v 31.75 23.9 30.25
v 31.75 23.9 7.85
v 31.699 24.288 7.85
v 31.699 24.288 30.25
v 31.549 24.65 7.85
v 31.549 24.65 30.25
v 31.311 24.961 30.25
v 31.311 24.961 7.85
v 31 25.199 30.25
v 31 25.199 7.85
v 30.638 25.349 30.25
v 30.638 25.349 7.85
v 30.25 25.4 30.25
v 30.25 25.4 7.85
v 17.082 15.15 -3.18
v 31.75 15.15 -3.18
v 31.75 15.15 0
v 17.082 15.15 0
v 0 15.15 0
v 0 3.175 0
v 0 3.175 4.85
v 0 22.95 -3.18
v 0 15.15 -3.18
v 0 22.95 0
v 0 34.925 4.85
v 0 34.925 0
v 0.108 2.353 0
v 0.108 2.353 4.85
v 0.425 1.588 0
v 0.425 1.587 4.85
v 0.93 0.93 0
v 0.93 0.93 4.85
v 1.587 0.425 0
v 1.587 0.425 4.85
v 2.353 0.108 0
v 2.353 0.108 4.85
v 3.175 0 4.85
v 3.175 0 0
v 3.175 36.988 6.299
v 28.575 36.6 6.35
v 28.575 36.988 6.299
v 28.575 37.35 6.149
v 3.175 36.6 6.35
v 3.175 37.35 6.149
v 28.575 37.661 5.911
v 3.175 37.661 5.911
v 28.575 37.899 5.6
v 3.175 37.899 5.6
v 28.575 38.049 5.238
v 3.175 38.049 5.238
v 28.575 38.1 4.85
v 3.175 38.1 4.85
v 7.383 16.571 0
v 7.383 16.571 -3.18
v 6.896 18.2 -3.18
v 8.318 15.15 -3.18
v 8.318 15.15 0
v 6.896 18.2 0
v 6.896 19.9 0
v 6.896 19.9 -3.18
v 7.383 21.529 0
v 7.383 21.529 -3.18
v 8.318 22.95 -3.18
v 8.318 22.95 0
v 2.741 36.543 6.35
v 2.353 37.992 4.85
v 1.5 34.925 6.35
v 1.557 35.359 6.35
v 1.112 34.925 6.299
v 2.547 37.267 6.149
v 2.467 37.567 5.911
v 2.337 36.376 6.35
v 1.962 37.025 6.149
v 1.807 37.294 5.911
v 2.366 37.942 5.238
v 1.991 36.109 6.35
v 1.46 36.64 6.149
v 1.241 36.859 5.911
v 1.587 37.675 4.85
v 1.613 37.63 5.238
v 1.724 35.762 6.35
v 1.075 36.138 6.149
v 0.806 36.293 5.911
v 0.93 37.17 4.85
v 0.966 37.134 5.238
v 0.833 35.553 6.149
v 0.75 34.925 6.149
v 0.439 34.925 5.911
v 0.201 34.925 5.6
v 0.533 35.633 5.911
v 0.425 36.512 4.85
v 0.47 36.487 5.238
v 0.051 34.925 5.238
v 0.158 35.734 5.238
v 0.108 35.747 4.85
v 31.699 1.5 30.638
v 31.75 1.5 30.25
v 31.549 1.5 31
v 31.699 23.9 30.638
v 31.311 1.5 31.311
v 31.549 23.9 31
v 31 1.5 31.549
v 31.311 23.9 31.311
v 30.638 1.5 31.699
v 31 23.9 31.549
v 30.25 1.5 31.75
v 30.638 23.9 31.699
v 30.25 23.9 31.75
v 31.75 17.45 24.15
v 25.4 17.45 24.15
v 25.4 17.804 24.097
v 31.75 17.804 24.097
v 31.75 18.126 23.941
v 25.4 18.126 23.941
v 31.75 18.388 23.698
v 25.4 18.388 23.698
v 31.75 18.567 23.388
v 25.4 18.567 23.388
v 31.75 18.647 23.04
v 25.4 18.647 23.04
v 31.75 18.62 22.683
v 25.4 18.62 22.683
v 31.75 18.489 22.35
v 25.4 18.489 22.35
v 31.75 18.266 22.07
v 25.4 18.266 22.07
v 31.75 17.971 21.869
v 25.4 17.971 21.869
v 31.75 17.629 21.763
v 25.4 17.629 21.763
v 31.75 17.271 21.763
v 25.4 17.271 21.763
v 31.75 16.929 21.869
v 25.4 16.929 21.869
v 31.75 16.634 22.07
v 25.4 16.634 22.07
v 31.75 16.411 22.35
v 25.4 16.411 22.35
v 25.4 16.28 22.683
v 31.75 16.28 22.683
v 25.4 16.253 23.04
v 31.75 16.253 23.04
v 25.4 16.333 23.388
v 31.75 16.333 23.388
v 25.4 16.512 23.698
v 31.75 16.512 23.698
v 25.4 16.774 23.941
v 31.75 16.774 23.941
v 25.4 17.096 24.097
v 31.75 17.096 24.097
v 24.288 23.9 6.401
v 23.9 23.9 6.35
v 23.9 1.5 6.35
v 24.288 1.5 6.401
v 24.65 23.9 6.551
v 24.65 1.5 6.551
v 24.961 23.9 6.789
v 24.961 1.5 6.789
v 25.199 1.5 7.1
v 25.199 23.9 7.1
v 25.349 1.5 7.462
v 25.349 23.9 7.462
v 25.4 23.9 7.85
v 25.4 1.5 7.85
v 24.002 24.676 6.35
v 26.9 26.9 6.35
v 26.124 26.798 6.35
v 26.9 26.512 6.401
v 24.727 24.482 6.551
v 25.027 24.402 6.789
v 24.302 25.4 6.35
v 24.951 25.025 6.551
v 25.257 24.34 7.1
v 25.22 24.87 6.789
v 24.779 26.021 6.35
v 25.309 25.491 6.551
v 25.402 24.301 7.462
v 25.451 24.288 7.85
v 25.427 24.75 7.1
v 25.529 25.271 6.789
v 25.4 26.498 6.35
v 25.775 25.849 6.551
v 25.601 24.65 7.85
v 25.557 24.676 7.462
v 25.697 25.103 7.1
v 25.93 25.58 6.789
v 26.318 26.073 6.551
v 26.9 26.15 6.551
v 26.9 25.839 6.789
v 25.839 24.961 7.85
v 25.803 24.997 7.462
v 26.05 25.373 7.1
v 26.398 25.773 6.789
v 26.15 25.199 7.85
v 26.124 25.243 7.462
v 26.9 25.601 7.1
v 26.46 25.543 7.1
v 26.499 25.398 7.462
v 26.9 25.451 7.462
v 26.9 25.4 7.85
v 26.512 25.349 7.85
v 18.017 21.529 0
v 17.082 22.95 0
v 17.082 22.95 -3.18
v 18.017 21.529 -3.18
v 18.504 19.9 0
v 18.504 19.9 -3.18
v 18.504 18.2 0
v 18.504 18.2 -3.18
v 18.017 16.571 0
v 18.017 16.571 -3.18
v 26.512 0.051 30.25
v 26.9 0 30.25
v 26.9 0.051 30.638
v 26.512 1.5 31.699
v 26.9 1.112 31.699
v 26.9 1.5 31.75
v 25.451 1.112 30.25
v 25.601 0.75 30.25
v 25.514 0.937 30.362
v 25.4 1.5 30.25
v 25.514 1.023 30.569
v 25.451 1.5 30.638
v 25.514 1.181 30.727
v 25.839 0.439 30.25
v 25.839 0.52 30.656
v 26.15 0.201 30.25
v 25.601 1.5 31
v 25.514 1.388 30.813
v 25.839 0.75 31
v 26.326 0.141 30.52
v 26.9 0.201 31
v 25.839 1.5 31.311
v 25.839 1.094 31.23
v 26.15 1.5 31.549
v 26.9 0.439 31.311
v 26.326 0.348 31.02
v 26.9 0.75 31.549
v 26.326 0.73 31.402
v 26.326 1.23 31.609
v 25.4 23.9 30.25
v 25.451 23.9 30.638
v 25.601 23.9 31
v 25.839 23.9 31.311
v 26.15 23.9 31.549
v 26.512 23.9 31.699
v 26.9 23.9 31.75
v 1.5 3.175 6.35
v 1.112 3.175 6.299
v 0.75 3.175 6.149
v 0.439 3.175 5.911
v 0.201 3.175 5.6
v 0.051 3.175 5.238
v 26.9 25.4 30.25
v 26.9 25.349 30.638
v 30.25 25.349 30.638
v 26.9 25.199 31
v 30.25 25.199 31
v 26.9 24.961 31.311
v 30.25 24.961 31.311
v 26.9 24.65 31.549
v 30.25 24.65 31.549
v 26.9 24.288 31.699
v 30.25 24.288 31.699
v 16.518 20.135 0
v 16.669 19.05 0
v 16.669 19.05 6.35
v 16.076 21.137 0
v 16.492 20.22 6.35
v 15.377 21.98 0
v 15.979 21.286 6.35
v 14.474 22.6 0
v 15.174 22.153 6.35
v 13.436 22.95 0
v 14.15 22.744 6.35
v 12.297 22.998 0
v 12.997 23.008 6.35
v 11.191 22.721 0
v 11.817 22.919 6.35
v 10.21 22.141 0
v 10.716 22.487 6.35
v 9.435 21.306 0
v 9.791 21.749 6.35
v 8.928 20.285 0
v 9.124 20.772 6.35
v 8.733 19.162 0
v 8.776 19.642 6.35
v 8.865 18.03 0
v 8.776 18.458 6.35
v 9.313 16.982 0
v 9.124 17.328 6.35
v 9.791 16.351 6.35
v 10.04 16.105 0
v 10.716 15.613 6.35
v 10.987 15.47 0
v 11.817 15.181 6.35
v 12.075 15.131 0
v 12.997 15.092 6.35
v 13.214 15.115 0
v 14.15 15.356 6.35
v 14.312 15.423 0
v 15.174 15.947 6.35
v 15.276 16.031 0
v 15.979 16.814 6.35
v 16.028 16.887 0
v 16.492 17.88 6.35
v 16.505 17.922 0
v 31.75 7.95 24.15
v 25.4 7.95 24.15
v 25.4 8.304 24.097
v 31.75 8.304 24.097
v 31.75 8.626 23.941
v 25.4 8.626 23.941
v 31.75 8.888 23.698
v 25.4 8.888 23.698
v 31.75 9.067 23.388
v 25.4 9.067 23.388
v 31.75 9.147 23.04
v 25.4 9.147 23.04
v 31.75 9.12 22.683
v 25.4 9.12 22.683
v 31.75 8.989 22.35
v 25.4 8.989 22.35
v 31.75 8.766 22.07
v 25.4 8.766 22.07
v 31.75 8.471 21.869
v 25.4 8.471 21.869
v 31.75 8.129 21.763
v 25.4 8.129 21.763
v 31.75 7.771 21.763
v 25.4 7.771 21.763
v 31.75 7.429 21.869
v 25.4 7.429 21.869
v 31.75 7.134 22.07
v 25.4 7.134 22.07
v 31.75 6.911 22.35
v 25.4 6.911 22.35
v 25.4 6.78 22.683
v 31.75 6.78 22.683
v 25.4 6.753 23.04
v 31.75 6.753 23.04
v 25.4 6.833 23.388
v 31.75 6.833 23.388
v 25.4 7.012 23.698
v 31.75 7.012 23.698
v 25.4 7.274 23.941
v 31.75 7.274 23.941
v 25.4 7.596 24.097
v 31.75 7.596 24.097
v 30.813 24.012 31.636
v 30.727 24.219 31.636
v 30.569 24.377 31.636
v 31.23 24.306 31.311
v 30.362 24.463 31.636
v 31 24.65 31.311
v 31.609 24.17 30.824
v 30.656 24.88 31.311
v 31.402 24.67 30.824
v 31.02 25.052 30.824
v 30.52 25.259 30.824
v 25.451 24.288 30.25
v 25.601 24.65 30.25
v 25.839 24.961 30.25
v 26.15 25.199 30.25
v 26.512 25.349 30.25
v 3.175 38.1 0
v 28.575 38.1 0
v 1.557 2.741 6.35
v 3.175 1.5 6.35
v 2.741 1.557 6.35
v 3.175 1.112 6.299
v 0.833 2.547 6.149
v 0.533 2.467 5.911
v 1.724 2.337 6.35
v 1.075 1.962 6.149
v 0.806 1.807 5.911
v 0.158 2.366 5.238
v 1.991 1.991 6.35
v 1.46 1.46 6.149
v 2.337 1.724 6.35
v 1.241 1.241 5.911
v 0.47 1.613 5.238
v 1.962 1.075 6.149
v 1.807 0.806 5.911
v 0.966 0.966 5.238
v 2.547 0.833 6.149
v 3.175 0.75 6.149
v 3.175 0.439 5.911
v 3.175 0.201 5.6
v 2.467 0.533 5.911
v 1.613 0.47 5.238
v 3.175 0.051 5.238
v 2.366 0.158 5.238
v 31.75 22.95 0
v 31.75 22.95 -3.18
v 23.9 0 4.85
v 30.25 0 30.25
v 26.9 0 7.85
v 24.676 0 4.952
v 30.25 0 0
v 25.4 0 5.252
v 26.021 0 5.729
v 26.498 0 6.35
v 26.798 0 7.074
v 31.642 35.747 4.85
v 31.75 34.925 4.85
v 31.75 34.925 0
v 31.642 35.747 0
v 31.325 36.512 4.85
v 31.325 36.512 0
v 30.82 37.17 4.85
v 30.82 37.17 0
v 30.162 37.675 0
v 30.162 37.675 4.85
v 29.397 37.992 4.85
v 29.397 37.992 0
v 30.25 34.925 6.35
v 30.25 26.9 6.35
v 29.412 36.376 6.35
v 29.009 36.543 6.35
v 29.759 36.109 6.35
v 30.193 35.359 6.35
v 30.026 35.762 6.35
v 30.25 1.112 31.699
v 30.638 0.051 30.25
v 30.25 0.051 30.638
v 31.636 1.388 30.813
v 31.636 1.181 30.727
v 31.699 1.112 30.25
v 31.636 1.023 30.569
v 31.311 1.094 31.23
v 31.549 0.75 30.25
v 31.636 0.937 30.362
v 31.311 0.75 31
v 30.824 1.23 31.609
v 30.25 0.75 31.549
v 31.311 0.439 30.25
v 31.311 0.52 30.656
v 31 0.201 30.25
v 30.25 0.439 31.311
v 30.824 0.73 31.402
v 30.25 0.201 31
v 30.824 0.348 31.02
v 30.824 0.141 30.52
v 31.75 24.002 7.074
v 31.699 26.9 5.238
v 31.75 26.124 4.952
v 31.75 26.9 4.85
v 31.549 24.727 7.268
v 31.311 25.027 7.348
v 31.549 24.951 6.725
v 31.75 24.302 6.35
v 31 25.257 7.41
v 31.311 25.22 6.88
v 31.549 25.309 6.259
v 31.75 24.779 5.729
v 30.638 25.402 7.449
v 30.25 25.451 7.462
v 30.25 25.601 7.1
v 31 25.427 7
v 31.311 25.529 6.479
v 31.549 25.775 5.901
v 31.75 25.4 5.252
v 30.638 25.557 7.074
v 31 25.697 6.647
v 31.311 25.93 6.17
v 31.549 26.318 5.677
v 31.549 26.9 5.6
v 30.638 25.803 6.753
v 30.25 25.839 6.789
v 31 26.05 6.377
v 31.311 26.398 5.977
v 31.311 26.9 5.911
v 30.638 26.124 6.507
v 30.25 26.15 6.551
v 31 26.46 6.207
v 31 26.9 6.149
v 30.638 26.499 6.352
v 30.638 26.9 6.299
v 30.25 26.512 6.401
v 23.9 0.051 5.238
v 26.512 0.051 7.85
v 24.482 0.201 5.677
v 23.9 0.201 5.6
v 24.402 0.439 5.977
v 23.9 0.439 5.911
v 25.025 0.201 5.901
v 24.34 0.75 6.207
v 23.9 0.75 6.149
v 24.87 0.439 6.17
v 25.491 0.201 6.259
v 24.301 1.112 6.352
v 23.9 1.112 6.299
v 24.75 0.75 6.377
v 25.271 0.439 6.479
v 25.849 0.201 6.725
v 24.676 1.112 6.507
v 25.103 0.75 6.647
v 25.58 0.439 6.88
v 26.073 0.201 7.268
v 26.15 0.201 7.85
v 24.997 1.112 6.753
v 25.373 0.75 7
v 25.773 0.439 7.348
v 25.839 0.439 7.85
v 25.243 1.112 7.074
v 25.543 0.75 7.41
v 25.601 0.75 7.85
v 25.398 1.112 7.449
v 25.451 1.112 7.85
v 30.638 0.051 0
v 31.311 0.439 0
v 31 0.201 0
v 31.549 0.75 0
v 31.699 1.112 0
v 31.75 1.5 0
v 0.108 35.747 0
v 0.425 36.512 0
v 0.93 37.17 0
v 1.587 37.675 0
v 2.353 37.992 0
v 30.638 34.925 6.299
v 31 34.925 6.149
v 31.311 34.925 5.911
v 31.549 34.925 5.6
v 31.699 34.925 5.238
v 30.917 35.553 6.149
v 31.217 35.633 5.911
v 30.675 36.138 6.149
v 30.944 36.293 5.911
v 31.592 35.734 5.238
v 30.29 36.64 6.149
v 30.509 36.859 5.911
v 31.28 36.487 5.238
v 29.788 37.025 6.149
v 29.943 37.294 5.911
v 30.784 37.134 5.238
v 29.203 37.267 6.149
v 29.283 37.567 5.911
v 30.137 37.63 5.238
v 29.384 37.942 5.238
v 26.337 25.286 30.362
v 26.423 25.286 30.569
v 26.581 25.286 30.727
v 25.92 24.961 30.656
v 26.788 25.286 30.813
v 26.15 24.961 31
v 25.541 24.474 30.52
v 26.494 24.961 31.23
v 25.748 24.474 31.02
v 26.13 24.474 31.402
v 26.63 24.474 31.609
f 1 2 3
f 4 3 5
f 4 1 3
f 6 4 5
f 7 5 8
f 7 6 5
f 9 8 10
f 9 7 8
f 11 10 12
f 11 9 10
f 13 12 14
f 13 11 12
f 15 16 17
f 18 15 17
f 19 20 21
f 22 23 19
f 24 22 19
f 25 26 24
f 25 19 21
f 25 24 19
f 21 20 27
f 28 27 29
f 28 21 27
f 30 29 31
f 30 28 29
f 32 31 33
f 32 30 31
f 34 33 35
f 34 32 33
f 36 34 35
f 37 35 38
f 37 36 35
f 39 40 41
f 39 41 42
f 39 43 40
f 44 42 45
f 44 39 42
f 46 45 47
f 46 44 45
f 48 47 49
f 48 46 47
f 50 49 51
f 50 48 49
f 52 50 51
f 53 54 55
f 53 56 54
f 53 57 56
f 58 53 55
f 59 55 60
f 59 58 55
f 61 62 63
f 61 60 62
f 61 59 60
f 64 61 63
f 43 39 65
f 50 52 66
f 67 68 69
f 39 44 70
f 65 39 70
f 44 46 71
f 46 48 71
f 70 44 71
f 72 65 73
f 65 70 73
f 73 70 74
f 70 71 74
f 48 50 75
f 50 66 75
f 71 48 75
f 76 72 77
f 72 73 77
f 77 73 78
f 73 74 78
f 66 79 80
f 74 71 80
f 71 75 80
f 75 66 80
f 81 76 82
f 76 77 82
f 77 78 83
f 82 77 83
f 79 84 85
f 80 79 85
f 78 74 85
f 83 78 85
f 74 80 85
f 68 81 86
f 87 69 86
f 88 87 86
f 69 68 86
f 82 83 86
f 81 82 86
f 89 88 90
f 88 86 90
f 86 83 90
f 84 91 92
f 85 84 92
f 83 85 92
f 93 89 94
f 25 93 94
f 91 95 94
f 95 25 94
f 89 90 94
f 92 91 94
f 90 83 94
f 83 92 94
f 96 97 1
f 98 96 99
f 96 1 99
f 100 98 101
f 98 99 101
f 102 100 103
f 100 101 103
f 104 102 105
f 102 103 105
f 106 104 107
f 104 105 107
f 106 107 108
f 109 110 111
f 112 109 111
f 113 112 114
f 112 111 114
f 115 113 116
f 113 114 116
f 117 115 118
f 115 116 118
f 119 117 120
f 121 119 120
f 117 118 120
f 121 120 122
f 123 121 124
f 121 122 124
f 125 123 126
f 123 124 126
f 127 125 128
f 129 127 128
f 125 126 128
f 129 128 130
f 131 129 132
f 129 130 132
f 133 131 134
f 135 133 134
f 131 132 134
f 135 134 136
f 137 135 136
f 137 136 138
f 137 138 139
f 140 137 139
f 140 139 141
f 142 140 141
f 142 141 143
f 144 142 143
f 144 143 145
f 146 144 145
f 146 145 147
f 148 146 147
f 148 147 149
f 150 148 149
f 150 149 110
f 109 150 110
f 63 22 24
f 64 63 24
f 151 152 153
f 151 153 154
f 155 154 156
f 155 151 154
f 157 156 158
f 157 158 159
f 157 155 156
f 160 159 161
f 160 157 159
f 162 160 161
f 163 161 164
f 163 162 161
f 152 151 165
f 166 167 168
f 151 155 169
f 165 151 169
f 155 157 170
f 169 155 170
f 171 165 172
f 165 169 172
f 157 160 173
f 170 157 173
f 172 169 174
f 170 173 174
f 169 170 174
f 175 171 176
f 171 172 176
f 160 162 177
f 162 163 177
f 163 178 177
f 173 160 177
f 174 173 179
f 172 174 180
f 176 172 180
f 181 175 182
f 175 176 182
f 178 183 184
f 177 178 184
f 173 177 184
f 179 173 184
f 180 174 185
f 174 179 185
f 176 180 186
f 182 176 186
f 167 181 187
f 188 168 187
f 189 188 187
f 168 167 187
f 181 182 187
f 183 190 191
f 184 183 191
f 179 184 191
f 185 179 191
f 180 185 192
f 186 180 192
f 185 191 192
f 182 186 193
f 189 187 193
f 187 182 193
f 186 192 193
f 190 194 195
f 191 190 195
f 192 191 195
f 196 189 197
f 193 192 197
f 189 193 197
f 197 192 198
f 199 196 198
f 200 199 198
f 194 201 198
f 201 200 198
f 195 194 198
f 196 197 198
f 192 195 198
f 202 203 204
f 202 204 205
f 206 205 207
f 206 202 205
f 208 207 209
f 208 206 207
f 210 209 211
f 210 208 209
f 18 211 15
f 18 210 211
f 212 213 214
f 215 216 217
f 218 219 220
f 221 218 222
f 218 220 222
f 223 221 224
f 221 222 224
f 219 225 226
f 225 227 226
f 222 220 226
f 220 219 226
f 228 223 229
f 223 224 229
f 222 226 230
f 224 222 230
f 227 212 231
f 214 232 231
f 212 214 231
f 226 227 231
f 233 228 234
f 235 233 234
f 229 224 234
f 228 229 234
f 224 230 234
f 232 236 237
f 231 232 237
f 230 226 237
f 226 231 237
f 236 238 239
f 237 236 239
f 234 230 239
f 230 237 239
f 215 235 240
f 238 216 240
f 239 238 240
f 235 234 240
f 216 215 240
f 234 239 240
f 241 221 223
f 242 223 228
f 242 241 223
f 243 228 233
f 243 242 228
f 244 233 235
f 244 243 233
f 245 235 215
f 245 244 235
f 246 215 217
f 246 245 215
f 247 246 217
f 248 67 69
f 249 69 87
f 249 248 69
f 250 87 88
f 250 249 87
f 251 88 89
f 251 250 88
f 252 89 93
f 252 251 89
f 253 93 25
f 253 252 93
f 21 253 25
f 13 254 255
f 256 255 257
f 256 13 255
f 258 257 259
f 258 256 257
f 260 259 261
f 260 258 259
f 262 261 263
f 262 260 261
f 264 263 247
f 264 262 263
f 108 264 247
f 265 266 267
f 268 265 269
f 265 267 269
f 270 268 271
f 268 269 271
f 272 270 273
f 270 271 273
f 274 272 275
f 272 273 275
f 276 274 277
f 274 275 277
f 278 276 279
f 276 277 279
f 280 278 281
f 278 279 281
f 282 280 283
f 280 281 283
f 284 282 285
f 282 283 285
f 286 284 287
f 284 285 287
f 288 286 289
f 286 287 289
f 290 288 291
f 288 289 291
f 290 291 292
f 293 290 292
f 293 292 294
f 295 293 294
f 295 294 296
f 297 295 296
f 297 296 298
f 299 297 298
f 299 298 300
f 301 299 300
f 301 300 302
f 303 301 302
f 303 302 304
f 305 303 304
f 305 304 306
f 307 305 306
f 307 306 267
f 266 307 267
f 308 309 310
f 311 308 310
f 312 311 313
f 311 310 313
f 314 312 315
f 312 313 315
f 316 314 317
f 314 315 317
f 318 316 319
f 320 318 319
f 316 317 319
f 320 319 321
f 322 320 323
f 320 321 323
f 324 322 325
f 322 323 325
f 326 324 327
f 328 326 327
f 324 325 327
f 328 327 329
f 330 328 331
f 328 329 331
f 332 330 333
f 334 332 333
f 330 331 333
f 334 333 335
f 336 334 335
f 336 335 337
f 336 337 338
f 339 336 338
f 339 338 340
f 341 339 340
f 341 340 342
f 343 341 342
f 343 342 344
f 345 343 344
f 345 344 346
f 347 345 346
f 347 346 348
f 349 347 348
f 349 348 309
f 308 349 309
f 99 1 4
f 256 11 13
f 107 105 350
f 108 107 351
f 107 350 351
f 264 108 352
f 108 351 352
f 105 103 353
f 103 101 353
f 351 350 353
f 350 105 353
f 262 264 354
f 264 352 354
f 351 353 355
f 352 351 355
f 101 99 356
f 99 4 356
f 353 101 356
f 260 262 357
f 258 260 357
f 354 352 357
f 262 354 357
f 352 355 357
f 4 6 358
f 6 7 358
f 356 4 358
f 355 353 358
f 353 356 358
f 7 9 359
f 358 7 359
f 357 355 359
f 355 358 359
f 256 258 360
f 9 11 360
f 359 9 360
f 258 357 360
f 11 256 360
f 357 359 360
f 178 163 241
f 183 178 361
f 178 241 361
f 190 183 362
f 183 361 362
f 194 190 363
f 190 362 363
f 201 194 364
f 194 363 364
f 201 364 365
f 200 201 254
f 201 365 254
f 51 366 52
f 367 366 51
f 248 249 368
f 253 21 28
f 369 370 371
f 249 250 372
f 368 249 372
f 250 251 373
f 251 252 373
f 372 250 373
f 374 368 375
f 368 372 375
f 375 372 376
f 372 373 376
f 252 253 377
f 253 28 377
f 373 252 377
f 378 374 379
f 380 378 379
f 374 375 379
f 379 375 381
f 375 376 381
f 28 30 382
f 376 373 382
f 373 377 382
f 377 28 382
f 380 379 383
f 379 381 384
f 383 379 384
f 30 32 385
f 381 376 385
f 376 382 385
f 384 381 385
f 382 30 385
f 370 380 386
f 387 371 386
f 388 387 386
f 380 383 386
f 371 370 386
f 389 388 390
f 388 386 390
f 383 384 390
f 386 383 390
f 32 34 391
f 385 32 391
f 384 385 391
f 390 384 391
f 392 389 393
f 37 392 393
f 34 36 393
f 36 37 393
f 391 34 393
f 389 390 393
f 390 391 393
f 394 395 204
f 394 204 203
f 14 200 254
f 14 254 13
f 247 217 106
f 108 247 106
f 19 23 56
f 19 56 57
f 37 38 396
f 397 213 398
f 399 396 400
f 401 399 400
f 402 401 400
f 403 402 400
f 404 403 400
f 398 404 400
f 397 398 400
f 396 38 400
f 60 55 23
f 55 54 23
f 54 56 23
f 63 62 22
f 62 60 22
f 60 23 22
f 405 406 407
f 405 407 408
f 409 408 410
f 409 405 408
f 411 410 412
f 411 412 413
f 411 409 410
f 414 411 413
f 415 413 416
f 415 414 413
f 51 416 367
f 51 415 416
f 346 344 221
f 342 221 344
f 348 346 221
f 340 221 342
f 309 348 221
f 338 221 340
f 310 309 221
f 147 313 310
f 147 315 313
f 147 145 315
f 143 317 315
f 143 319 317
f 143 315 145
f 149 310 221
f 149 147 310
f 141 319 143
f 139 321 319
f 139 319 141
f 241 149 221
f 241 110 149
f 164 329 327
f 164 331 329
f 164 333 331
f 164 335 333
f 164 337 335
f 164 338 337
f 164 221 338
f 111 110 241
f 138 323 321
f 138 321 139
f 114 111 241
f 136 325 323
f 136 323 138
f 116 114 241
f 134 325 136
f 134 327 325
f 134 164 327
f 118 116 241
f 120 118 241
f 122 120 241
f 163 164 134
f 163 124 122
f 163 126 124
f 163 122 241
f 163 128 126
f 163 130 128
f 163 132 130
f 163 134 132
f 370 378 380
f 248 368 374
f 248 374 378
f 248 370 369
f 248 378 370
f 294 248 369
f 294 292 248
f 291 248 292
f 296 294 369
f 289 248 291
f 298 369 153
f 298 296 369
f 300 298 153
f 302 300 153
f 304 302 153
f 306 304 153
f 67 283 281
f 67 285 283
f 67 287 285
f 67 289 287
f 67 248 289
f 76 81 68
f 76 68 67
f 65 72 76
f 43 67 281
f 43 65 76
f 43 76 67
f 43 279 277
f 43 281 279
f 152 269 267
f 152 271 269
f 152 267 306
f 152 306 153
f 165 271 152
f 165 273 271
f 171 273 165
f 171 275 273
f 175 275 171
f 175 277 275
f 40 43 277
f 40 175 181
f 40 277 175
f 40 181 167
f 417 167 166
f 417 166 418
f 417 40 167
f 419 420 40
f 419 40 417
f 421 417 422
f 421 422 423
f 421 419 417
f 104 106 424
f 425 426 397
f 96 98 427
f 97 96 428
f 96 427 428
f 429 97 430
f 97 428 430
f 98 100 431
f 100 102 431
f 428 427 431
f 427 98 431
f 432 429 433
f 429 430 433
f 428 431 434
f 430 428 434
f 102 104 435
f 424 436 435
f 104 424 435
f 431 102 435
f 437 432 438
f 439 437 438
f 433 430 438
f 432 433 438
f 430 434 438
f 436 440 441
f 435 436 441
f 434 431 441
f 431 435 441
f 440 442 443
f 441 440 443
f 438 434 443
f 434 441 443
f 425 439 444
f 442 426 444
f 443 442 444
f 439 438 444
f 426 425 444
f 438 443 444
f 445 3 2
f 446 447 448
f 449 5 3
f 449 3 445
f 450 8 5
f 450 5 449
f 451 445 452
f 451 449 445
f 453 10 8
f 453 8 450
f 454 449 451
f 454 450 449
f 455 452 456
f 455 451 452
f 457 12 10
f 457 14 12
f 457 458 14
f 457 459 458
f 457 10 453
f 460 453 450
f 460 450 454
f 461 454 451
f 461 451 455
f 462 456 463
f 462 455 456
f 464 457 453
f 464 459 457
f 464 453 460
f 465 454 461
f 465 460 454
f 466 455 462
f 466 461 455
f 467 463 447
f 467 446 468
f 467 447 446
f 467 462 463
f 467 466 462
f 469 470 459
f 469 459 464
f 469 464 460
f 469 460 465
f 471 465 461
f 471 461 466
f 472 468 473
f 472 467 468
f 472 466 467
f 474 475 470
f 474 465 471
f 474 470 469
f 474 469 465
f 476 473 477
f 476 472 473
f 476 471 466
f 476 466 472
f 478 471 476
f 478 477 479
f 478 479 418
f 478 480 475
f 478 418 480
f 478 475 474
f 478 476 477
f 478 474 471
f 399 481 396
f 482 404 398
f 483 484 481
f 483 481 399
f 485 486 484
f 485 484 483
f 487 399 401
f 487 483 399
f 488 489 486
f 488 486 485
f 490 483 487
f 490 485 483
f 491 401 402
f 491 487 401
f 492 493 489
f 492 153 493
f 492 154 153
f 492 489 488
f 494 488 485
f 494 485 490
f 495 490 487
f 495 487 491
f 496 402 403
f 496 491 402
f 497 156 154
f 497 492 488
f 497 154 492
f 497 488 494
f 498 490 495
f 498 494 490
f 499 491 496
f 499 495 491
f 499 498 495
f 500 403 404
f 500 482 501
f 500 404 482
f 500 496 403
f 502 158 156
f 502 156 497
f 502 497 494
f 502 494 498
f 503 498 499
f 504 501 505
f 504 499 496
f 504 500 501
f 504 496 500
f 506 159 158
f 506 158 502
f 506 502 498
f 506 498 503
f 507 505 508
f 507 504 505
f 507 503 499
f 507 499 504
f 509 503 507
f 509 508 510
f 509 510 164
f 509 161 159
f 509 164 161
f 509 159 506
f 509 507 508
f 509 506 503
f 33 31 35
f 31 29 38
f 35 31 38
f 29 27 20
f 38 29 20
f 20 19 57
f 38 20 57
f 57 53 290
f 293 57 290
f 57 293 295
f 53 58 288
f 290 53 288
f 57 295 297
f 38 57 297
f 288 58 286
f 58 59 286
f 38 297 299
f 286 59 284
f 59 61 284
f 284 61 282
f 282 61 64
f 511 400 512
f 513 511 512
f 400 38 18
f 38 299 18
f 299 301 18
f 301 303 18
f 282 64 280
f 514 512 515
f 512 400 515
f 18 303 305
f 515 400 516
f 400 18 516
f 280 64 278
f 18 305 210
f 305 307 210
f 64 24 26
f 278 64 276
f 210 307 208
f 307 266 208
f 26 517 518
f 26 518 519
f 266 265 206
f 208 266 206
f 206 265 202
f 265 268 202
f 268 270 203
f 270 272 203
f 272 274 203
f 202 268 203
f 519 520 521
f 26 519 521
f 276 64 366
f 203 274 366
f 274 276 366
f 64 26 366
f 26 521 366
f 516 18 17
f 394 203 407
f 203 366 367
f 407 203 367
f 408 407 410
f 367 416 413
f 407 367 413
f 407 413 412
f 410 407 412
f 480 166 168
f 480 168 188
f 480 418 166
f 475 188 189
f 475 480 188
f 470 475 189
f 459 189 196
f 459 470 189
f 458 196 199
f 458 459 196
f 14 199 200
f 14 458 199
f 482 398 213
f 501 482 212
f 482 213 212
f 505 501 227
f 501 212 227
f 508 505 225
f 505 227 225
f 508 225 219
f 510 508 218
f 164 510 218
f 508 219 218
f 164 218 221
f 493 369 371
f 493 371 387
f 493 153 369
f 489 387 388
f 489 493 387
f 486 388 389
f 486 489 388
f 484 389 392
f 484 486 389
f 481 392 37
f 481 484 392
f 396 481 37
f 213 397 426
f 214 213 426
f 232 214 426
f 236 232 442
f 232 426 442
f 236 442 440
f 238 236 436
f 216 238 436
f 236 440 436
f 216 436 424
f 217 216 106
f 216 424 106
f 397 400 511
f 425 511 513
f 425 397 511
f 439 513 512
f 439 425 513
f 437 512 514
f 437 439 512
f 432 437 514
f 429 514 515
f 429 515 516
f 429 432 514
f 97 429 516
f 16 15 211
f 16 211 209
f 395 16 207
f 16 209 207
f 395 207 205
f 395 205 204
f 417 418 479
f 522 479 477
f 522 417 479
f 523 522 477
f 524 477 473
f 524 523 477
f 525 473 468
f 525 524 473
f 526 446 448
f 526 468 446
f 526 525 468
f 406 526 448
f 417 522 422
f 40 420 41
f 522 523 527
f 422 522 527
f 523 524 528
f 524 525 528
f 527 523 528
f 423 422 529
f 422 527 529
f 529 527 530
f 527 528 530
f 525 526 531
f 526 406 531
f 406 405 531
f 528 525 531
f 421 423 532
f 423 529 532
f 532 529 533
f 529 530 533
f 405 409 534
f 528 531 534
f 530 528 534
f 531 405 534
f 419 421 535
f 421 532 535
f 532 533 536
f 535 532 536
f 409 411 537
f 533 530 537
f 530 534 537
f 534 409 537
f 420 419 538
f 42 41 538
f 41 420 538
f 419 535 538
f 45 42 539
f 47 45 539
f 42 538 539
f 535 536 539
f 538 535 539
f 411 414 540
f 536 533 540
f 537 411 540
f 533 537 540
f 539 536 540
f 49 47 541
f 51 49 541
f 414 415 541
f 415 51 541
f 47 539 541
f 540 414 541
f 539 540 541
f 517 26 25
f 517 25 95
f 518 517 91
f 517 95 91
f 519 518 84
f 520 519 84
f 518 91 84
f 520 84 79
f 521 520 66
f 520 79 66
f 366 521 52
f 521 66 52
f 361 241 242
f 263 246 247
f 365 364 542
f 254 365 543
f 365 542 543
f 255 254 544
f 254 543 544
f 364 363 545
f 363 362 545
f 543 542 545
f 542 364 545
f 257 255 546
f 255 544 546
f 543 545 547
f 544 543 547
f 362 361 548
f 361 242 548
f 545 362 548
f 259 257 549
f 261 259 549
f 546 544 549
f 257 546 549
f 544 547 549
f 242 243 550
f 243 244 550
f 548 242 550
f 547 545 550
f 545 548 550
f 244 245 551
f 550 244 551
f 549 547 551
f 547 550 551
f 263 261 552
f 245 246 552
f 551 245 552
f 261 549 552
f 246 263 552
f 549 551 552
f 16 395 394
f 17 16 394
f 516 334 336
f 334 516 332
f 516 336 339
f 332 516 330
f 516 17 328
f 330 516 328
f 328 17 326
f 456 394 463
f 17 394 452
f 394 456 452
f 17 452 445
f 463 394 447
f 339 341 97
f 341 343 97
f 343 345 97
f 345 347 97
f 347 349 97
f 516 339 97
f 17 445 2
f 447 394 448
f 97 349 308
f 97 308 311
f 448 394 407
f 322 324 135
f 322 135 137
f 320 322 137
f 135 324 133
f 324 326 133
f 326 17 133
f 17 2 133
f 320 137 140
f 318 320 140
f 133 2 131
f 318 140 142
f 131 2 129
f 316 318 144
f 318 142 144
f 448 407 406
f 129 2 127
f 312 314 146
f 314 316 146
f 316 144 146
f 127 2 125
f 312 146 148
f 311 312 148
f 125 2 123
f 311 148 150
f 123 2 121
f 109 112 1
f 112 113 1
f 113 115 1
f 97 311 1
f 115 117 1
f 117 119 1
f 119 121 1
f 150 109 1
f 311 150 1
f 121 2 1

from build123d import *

# Parameters (mm, degrees)
SKETCH1_W           = 31.75
SKETCH1_H           = 38.1
BOSS_EXTRUDE1_DEPTH = 6.35
SKETCH2_W           = 6.35
SKETCH2_H           = 25.4
BOSS_EXTRUDE2_DEPTH = 25.4
SKETCH3_R           = 1.2
CUT_EXTRUDE1_DEPTH  = 7.35
SKETCH4_R           = 3.96875
CUT_EXTRUDE2_DEPTH  = 7.35
SKETCH5_W           = 3.18
SKETCH5_H           = 7.8
BOSS_EXTRUDE3_DEPTH = 31.75
FILLET1_R           = 3.175
FILLET2_R           = 1.5
CUT_EXTRUDE3_DEPTH  = 4.18
SKETCH7_R           = 5.866318131
CUT_EXTRUDE4_DEPTH  = 3.18


with BuildPart() as part:
    # Sketch1 → Boss-Extrude1 (new body)
    with BuildSketch(Plane.XY):
        with Locations((15.875, 19.05)):
            Rectangle(SKETCH1_W, SKETCH1_H)
    extrude(amount=BOSS_EXTRUDE1_DEPTH)

    # Sketch2 → Boss-Extrude2 (add)
    with BuildSketch(Plane.XY.offset(6.35)):
        with Locations((28.575, 12.7)):
            Rectangle(SKETCH2_W, SKETCH2_H)
    extrude(amount=BOSS_EXTRUDE2_DEPTH)

    # Sketch3 → Cut-Extrude1 (cut, through all)
    with BuildSketch(Plane.ZY.offset(-25.4)):
        with Locations((22.95, 17.45)):
            Circle(SKETCH3_R)
        with Locations((22.95, 7.95)):
            Circle(SKETCH3_R)
    extrude(amount=-CUT_EXTRUDE1_DEPTH, mode=Mode.SUBTRACT)

    # Sketch4 → Cut-Extrude2 (cut, through all)
    with BuildSketch(Plane.XY.offset(6.35)):
        with Locations((12.7, 19.05)):
            Circle(SKETCH4_R)
    extrude(amount=-CUT_EXTRUDE2_DEPTH, mode=Mode.SUBTRACT)

    # Sketch5 → Boss-Extrude3 (add)
    with BuildSketch(Plane.ZY):
        with Locations((-1.59, 19.05)):
            Rectangle(SKETCH5_W, SKETCH5_H)
    extrude(amount=-BOSS_EXTRUDE3_DEPTH)

    # Fillet1
    fillet1_edges = [part.edges().sort_by_distance(p)[0] for p in [
        (0, 0, 3.175),
        (0, 38.1, 3.175),
        (31.75, 38.1, 3.175),
    ]]
    fillet(fillet1_edges, radius=FILLET1_R)

    # Fillet2
    fillet2_edges = [part.edges().sort_by_distance(p)[0] for p in [
        (31.75, 30.1625, 6.35),
        (28.575, 0, 31.75),
        (25.4, 0, 19.05),
        (28.575, 25.4, 6.35),
        (31.75, 25.4, 19.05),
        (25.4, 12.7, 31.75),
        (25.4, 25.4, 19.05),
        (31.75, 12.7, 31.75),
        (28.575, 25.4, 31.75),
        (25.4, 12.7, 6.35),
        (15.875, 38.1, 6.35),
        (14.2875, 0, 6.35),
        (0, 19.05, 6.35),
        (0.92993597, 0.92993597, 6.35),
        (0.92993597, 37.17006403, 6.35),
        (30.82006403, 37.17006403, 6.35),
        (31.75, 0, 15.875),
    ]]
    fillet(fillet2_edges, radius=FILLET2_R)

    # Sketch6 → Cut-Extrude3 (cut, through all)
    with BuildSketch(Plane.XY):
        with BuildLine():
            Line((13.435511089, 22.95), (11.964488911, 22.95))
            ThreePointArc((11.964488911, 22.95), (8.73125, 19.05), (11.964488911, 15.15))
            Line((11.964488911, 15.15), (13.435511089, 15.15))
            ThreePointArc((13.435511089, 15.15), (16.66875, 19.05), (13.435511089, 22.95))
        make_face()
    extrude(amount=-CUT_EXTRUDE3_DEPTH, mode=Mode.SUBTRACT)

    # Sketch7 → Cut-Extrude4 (cut)
    with BuildSketch(Plane(origin=(0, 0, 0), x_dir=(-1, 0, 0), z_dir=(0, 0, -1))):
        with Locations((-12.7, 19.05)):
            Circle(SKETCH7_R)
    extrude(amount=CUT_EXTRUDE4_DEPTH, mode=Mode.SUBTRACT)


solid = part.part
